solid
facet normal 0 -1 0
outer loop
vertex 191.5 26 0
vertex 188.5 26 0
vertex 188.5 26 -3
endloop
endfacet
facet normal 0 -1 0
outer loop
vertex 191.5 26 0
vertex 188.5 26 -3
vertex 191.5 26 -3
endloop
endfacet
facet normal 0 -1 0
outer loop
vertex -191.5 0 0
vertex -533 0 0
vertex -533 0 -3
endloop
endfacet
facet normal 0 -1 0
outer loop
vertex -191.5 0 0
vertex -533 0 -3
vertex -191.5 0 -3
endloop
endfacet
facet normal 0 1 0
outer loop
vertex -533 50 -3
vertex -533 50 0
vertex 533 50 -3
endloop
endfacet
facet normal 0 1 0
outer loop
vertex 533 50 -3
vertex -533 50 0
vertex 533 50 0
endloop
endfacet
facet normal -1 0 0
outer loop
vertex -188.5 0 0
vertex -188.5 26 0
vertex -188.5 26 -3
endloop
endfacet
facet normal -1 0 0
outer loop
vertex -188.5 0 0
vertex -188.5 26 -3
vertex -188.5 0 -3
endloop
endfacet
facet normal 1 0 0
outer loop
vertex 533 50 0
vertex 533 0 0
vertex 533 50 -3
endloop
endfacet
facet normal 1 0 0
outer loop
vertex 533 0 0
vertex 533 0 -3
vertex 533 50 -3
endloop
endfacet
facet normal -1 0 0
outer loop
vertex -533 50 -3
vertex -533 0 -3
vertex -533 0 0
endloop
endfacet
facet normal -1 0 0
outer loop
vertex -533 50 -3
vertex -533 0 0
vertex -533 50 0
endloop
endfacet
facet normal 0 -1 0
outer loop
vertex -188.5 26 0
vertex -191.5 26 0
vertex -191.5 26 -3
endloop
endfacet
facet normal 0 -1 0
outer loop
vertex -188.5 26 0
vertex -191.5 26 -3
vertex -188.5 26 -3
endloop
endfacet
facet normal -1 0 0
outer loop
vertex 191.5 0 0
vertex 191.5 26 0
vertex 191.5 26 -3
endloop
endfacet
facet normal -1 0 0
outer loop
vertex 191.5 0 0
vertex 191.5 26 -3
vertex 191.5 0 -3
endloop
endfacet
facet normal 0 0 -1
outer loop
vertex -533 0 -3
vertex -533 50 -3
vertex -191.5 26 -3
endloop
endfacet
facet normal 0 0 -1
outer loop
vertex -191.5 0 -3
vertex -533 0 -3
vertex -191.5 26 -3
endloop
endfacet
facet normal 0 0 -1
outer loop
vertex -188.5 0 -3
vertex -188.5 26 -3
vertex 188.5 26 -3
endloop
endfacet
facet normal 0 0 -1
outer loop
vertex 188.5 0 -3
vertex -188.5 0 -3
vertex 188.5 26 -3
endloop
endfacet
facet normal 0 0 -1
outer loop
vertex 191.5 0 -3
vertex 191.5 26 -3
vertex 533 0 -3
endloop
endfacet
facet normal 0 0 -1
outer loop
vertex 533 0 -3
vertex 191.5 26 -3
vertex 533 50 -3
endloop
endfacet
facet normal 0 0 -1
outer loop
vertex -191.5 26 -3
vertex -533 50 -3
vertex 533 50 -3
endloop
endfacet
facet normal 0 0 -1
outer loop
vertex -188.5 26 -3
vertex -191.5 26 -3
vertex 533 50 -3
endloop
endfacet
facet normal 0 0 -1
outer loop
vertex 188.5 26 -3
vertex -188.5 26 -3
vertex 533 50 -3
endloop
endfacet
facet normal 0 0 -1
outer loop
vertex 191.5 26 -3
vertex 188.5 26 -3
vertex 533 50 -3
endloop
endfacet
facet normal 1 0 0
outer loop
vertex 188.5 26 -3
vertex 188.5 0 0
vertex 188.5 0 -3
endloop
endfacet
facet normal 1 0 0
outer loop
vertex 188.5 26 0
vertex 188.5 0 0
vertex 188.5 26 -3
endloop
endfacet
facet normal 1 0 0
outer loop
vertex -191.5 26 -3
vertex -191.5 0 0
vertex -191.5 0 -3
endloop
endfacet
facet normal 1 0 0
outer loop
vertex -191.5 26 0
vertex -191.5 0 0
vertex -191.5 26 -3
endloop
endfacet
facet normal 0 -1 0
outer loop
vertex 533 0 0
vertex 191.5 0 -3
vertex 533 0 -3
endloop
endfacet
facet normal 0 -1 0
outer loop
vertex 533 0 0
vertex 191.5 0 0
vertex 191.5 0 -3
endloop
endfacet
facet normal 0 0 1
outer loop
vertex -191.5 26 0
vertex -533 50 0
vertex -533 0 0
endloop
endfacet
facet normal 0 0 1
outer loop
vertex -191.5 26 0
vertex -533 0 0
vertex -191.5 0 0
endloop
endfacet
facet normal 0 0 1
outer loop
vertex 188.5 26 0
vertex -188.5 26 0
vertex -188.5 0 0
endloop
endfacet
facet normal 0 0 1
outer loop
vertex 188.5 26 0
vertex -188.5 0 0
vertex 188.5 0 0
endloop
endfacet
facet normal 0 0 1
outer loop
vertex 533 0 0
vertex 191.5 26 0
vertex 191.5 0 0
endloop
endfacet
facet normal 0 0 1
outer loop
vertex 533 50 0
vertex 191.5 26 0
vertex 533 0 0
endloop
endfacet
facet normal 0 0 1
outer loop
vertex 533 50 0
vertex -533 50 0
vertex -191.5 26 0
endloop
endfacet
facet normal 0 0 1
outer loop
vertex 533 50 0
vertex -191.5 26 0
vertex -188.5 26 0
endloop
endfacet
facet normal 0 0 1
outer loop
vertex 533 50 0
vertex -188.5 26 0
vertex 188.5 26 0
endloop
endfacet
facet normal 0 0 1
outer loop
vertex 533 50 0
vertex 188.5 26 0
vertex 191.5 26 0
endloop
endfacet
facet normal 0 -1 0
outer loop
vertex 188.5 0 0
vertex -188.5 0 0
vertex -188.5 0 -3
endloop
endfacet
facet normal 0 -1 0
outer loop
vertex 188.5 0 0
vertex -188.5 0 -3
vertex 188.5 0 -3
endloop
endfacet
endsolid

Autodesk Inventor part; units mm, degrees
ref_plane "YZ Plane" through (0, 0, 0) normal (1, 0, 0) x (0, 1, 0)
ref_plane "XZ Plane" through (0, 0, 0) normal (0, 1, 0) x (-1, 0, 0)
ref_plane "XY Plane" through (0, 0, 0) normal (0, 0, 1) x (1, 0, 0)
sketch "Sketch1" plane through (0, 0, 0) normal (0, 0, 1) x (1, 0, 0)
  line L0 (-600, 0) -> (600, 0)
  line L1 (-600, 0) -> (-600, 50)
  line L2 (-600, 50) -> (600, 50)
  line L3 (600, 50) -> (600, 0)
  circle A0 centre (-600, 0) radius 25
  circle A1 centre (600, 0) radius 25
  line L4 (600, 0) -> (644.2345, 16.1001)
  line L5 (644.2345, 16.1001) -> (635, 50)
  line L6 (635, 50) -> (600, 50)
  point P0 (0, 0)
  point P1 (0, 0)
  point P2 (-600, 25)
  point P3 (-575, 0)
  point P4 (575, 0)
  point P5 (600, 25)
  point P6 (623.4923, 8.5505)
  dimension "d18" = 50
  dimension "d19" = 1200
  dimension "d25" = 50
  dimension "d26" = 50
  dimension "d39" = 70
  dimension "d40" = 35
extrude "Plate2" add sketch "Sketch1" against normal blind 3 contours L1 A0 L0 | A0 L1 L2 L3 A1 L0 | A1 L3 L0 picked at (-598.1457, 16.4577)
sketch "Sketch3" plane through (0, 0, 0) normal (0, 0, 1) x (1, 0, 0)
  line L0 (-190, 0) -> (-190, 50) construction
  line L1 (600, 50) -> (-600, 50) projected
  line L2 (-600, 50) -> (-600, 0) projected
  line L3 (-191.5, 26) -> (-188.5, 26)
  line L4 (-188.5, 26) -> (-188.5, 0)
  line L5 (-188.5, 0) -> (-191.5, 0)
  line L6 (-191.5, 0) -> (-191.5, 26)
  line L7 (-600, 0) -> (600, 0) projected
  line L8 (190, 50) -> (190, 0) construction
  line L9 (188.5, 26) -> (191.5, 26)
  line L10 (191.5, 26) -> (191.5, 0)
  line L11 (191.5, 0) -> (188.5, 0)
  line L12 (188.5, 0) -> (188.5, 26)
  point P0 (0, 0)
  point P1 (0, 0)
  point P2 (0, 0)
  point P3 (191.5, 0)
  dimension "d28" = 3
  dimension "d29" = 26
  dimension "d35" = 190
  dimension "d36" = 190
  dimension "d37" = 3
  dimension "d38" = 26
extrude "Extrusion2" cut sketch "Sketch3" against normal through all
sketch "Sketch4" plane through (0, 0, -3) normal (0, 0, -1) x (-1, 0, 0)
  line L0 (188.5, 0) -> (188.5, 26) projected
  line L1 (188.5, 26) -> (191.5, 26) projected
  line L2 (191.5, 26) -> (191.5, 0) projected
  line L3 (600, 0) -> (191.5, 0) projected
  line L4 (600, 50) -> (600, 0) projected
  line L5 (-600, 50) -> (600, 50) projected
  line L6 (-600, 0) -> (-600, 50) projected
  line L7 (-191.5, 0) -> (-600, 0) projected
  line L8 (-191.5, 0) -> (-191.5, 26) projected
  line L9 (-191.5, 26) -> (-188.5, 26) projected
  line L10 (-188.5, 26) -> (-188.5, 0) projected
  line L11 (188.5, 0) -> (-188.5, 0) projected
  line L12 (-533, 0) -> (-533, 50)
  line L13 (-600, 50) -> (600, 50) projected
  line L14 (600, 0) -> (191.5, 0) projected
  line L15 (533, 0) -> (533, 50)
  point P0 (0, 0)
  point P1 (533, 0)
  dimension "d45" = 67
  dimension "d46" = 67
extrude "Extrusion3" cut sketch "Sketch4" against normal through all contours L15 L5 L4 L3 | L7 L6 L5 L12
sketch "Sketch5" plane through (0, 0, 0) normal (0, 0, 1) x (1, 0, 0)
  line L0 (-55.7541, 0.5014) -> (-55.7541, 31.0924) construction
  line L1 (-55.7541, 31.0924) -> (66.2742, 31.0924) construction
  line L2 (66.2742, 31.0924) -> (66.2742, 0.5014) construction
  line L3 (66.2742, 0.5014) -> (-55.7541, 0.5014) construction
  line L4 (533, 50) -> (-533, 50) projected
  line L5 (-533, 50) -> (-533, 0) projected
  point P0 (0, 0)
mark "Mark1"
equation "\"d28\" = Thickness"
equation "\"d36\" = d35"
equation "\"d37\" = Thickness"
equation "\"d38\" = d29"
equation "\"d46\" = d45"
equation "\"d20\" = Thickness"
equation "\"BendReliefWidth\" = Thickness"
equation "\"BendReliefDepth\" = 0.5 * Thickness"
equation "\"CornerReliefSize\" = 4 * Thickness"
equation "\"MinimumRemnant\" = 2 * Thickness"
equation "\"TransitionRadius\" = BendRadius"
equation "\"JacobiRadiusSize\" = BendRadius"
equation "\"GapSize\" = Thickness"
equation "\"Thickness\" = 3"
equation "\"BendRadius\" = 5"
properties part number "MSC 106 rib cone" material "Stainless Steel"
